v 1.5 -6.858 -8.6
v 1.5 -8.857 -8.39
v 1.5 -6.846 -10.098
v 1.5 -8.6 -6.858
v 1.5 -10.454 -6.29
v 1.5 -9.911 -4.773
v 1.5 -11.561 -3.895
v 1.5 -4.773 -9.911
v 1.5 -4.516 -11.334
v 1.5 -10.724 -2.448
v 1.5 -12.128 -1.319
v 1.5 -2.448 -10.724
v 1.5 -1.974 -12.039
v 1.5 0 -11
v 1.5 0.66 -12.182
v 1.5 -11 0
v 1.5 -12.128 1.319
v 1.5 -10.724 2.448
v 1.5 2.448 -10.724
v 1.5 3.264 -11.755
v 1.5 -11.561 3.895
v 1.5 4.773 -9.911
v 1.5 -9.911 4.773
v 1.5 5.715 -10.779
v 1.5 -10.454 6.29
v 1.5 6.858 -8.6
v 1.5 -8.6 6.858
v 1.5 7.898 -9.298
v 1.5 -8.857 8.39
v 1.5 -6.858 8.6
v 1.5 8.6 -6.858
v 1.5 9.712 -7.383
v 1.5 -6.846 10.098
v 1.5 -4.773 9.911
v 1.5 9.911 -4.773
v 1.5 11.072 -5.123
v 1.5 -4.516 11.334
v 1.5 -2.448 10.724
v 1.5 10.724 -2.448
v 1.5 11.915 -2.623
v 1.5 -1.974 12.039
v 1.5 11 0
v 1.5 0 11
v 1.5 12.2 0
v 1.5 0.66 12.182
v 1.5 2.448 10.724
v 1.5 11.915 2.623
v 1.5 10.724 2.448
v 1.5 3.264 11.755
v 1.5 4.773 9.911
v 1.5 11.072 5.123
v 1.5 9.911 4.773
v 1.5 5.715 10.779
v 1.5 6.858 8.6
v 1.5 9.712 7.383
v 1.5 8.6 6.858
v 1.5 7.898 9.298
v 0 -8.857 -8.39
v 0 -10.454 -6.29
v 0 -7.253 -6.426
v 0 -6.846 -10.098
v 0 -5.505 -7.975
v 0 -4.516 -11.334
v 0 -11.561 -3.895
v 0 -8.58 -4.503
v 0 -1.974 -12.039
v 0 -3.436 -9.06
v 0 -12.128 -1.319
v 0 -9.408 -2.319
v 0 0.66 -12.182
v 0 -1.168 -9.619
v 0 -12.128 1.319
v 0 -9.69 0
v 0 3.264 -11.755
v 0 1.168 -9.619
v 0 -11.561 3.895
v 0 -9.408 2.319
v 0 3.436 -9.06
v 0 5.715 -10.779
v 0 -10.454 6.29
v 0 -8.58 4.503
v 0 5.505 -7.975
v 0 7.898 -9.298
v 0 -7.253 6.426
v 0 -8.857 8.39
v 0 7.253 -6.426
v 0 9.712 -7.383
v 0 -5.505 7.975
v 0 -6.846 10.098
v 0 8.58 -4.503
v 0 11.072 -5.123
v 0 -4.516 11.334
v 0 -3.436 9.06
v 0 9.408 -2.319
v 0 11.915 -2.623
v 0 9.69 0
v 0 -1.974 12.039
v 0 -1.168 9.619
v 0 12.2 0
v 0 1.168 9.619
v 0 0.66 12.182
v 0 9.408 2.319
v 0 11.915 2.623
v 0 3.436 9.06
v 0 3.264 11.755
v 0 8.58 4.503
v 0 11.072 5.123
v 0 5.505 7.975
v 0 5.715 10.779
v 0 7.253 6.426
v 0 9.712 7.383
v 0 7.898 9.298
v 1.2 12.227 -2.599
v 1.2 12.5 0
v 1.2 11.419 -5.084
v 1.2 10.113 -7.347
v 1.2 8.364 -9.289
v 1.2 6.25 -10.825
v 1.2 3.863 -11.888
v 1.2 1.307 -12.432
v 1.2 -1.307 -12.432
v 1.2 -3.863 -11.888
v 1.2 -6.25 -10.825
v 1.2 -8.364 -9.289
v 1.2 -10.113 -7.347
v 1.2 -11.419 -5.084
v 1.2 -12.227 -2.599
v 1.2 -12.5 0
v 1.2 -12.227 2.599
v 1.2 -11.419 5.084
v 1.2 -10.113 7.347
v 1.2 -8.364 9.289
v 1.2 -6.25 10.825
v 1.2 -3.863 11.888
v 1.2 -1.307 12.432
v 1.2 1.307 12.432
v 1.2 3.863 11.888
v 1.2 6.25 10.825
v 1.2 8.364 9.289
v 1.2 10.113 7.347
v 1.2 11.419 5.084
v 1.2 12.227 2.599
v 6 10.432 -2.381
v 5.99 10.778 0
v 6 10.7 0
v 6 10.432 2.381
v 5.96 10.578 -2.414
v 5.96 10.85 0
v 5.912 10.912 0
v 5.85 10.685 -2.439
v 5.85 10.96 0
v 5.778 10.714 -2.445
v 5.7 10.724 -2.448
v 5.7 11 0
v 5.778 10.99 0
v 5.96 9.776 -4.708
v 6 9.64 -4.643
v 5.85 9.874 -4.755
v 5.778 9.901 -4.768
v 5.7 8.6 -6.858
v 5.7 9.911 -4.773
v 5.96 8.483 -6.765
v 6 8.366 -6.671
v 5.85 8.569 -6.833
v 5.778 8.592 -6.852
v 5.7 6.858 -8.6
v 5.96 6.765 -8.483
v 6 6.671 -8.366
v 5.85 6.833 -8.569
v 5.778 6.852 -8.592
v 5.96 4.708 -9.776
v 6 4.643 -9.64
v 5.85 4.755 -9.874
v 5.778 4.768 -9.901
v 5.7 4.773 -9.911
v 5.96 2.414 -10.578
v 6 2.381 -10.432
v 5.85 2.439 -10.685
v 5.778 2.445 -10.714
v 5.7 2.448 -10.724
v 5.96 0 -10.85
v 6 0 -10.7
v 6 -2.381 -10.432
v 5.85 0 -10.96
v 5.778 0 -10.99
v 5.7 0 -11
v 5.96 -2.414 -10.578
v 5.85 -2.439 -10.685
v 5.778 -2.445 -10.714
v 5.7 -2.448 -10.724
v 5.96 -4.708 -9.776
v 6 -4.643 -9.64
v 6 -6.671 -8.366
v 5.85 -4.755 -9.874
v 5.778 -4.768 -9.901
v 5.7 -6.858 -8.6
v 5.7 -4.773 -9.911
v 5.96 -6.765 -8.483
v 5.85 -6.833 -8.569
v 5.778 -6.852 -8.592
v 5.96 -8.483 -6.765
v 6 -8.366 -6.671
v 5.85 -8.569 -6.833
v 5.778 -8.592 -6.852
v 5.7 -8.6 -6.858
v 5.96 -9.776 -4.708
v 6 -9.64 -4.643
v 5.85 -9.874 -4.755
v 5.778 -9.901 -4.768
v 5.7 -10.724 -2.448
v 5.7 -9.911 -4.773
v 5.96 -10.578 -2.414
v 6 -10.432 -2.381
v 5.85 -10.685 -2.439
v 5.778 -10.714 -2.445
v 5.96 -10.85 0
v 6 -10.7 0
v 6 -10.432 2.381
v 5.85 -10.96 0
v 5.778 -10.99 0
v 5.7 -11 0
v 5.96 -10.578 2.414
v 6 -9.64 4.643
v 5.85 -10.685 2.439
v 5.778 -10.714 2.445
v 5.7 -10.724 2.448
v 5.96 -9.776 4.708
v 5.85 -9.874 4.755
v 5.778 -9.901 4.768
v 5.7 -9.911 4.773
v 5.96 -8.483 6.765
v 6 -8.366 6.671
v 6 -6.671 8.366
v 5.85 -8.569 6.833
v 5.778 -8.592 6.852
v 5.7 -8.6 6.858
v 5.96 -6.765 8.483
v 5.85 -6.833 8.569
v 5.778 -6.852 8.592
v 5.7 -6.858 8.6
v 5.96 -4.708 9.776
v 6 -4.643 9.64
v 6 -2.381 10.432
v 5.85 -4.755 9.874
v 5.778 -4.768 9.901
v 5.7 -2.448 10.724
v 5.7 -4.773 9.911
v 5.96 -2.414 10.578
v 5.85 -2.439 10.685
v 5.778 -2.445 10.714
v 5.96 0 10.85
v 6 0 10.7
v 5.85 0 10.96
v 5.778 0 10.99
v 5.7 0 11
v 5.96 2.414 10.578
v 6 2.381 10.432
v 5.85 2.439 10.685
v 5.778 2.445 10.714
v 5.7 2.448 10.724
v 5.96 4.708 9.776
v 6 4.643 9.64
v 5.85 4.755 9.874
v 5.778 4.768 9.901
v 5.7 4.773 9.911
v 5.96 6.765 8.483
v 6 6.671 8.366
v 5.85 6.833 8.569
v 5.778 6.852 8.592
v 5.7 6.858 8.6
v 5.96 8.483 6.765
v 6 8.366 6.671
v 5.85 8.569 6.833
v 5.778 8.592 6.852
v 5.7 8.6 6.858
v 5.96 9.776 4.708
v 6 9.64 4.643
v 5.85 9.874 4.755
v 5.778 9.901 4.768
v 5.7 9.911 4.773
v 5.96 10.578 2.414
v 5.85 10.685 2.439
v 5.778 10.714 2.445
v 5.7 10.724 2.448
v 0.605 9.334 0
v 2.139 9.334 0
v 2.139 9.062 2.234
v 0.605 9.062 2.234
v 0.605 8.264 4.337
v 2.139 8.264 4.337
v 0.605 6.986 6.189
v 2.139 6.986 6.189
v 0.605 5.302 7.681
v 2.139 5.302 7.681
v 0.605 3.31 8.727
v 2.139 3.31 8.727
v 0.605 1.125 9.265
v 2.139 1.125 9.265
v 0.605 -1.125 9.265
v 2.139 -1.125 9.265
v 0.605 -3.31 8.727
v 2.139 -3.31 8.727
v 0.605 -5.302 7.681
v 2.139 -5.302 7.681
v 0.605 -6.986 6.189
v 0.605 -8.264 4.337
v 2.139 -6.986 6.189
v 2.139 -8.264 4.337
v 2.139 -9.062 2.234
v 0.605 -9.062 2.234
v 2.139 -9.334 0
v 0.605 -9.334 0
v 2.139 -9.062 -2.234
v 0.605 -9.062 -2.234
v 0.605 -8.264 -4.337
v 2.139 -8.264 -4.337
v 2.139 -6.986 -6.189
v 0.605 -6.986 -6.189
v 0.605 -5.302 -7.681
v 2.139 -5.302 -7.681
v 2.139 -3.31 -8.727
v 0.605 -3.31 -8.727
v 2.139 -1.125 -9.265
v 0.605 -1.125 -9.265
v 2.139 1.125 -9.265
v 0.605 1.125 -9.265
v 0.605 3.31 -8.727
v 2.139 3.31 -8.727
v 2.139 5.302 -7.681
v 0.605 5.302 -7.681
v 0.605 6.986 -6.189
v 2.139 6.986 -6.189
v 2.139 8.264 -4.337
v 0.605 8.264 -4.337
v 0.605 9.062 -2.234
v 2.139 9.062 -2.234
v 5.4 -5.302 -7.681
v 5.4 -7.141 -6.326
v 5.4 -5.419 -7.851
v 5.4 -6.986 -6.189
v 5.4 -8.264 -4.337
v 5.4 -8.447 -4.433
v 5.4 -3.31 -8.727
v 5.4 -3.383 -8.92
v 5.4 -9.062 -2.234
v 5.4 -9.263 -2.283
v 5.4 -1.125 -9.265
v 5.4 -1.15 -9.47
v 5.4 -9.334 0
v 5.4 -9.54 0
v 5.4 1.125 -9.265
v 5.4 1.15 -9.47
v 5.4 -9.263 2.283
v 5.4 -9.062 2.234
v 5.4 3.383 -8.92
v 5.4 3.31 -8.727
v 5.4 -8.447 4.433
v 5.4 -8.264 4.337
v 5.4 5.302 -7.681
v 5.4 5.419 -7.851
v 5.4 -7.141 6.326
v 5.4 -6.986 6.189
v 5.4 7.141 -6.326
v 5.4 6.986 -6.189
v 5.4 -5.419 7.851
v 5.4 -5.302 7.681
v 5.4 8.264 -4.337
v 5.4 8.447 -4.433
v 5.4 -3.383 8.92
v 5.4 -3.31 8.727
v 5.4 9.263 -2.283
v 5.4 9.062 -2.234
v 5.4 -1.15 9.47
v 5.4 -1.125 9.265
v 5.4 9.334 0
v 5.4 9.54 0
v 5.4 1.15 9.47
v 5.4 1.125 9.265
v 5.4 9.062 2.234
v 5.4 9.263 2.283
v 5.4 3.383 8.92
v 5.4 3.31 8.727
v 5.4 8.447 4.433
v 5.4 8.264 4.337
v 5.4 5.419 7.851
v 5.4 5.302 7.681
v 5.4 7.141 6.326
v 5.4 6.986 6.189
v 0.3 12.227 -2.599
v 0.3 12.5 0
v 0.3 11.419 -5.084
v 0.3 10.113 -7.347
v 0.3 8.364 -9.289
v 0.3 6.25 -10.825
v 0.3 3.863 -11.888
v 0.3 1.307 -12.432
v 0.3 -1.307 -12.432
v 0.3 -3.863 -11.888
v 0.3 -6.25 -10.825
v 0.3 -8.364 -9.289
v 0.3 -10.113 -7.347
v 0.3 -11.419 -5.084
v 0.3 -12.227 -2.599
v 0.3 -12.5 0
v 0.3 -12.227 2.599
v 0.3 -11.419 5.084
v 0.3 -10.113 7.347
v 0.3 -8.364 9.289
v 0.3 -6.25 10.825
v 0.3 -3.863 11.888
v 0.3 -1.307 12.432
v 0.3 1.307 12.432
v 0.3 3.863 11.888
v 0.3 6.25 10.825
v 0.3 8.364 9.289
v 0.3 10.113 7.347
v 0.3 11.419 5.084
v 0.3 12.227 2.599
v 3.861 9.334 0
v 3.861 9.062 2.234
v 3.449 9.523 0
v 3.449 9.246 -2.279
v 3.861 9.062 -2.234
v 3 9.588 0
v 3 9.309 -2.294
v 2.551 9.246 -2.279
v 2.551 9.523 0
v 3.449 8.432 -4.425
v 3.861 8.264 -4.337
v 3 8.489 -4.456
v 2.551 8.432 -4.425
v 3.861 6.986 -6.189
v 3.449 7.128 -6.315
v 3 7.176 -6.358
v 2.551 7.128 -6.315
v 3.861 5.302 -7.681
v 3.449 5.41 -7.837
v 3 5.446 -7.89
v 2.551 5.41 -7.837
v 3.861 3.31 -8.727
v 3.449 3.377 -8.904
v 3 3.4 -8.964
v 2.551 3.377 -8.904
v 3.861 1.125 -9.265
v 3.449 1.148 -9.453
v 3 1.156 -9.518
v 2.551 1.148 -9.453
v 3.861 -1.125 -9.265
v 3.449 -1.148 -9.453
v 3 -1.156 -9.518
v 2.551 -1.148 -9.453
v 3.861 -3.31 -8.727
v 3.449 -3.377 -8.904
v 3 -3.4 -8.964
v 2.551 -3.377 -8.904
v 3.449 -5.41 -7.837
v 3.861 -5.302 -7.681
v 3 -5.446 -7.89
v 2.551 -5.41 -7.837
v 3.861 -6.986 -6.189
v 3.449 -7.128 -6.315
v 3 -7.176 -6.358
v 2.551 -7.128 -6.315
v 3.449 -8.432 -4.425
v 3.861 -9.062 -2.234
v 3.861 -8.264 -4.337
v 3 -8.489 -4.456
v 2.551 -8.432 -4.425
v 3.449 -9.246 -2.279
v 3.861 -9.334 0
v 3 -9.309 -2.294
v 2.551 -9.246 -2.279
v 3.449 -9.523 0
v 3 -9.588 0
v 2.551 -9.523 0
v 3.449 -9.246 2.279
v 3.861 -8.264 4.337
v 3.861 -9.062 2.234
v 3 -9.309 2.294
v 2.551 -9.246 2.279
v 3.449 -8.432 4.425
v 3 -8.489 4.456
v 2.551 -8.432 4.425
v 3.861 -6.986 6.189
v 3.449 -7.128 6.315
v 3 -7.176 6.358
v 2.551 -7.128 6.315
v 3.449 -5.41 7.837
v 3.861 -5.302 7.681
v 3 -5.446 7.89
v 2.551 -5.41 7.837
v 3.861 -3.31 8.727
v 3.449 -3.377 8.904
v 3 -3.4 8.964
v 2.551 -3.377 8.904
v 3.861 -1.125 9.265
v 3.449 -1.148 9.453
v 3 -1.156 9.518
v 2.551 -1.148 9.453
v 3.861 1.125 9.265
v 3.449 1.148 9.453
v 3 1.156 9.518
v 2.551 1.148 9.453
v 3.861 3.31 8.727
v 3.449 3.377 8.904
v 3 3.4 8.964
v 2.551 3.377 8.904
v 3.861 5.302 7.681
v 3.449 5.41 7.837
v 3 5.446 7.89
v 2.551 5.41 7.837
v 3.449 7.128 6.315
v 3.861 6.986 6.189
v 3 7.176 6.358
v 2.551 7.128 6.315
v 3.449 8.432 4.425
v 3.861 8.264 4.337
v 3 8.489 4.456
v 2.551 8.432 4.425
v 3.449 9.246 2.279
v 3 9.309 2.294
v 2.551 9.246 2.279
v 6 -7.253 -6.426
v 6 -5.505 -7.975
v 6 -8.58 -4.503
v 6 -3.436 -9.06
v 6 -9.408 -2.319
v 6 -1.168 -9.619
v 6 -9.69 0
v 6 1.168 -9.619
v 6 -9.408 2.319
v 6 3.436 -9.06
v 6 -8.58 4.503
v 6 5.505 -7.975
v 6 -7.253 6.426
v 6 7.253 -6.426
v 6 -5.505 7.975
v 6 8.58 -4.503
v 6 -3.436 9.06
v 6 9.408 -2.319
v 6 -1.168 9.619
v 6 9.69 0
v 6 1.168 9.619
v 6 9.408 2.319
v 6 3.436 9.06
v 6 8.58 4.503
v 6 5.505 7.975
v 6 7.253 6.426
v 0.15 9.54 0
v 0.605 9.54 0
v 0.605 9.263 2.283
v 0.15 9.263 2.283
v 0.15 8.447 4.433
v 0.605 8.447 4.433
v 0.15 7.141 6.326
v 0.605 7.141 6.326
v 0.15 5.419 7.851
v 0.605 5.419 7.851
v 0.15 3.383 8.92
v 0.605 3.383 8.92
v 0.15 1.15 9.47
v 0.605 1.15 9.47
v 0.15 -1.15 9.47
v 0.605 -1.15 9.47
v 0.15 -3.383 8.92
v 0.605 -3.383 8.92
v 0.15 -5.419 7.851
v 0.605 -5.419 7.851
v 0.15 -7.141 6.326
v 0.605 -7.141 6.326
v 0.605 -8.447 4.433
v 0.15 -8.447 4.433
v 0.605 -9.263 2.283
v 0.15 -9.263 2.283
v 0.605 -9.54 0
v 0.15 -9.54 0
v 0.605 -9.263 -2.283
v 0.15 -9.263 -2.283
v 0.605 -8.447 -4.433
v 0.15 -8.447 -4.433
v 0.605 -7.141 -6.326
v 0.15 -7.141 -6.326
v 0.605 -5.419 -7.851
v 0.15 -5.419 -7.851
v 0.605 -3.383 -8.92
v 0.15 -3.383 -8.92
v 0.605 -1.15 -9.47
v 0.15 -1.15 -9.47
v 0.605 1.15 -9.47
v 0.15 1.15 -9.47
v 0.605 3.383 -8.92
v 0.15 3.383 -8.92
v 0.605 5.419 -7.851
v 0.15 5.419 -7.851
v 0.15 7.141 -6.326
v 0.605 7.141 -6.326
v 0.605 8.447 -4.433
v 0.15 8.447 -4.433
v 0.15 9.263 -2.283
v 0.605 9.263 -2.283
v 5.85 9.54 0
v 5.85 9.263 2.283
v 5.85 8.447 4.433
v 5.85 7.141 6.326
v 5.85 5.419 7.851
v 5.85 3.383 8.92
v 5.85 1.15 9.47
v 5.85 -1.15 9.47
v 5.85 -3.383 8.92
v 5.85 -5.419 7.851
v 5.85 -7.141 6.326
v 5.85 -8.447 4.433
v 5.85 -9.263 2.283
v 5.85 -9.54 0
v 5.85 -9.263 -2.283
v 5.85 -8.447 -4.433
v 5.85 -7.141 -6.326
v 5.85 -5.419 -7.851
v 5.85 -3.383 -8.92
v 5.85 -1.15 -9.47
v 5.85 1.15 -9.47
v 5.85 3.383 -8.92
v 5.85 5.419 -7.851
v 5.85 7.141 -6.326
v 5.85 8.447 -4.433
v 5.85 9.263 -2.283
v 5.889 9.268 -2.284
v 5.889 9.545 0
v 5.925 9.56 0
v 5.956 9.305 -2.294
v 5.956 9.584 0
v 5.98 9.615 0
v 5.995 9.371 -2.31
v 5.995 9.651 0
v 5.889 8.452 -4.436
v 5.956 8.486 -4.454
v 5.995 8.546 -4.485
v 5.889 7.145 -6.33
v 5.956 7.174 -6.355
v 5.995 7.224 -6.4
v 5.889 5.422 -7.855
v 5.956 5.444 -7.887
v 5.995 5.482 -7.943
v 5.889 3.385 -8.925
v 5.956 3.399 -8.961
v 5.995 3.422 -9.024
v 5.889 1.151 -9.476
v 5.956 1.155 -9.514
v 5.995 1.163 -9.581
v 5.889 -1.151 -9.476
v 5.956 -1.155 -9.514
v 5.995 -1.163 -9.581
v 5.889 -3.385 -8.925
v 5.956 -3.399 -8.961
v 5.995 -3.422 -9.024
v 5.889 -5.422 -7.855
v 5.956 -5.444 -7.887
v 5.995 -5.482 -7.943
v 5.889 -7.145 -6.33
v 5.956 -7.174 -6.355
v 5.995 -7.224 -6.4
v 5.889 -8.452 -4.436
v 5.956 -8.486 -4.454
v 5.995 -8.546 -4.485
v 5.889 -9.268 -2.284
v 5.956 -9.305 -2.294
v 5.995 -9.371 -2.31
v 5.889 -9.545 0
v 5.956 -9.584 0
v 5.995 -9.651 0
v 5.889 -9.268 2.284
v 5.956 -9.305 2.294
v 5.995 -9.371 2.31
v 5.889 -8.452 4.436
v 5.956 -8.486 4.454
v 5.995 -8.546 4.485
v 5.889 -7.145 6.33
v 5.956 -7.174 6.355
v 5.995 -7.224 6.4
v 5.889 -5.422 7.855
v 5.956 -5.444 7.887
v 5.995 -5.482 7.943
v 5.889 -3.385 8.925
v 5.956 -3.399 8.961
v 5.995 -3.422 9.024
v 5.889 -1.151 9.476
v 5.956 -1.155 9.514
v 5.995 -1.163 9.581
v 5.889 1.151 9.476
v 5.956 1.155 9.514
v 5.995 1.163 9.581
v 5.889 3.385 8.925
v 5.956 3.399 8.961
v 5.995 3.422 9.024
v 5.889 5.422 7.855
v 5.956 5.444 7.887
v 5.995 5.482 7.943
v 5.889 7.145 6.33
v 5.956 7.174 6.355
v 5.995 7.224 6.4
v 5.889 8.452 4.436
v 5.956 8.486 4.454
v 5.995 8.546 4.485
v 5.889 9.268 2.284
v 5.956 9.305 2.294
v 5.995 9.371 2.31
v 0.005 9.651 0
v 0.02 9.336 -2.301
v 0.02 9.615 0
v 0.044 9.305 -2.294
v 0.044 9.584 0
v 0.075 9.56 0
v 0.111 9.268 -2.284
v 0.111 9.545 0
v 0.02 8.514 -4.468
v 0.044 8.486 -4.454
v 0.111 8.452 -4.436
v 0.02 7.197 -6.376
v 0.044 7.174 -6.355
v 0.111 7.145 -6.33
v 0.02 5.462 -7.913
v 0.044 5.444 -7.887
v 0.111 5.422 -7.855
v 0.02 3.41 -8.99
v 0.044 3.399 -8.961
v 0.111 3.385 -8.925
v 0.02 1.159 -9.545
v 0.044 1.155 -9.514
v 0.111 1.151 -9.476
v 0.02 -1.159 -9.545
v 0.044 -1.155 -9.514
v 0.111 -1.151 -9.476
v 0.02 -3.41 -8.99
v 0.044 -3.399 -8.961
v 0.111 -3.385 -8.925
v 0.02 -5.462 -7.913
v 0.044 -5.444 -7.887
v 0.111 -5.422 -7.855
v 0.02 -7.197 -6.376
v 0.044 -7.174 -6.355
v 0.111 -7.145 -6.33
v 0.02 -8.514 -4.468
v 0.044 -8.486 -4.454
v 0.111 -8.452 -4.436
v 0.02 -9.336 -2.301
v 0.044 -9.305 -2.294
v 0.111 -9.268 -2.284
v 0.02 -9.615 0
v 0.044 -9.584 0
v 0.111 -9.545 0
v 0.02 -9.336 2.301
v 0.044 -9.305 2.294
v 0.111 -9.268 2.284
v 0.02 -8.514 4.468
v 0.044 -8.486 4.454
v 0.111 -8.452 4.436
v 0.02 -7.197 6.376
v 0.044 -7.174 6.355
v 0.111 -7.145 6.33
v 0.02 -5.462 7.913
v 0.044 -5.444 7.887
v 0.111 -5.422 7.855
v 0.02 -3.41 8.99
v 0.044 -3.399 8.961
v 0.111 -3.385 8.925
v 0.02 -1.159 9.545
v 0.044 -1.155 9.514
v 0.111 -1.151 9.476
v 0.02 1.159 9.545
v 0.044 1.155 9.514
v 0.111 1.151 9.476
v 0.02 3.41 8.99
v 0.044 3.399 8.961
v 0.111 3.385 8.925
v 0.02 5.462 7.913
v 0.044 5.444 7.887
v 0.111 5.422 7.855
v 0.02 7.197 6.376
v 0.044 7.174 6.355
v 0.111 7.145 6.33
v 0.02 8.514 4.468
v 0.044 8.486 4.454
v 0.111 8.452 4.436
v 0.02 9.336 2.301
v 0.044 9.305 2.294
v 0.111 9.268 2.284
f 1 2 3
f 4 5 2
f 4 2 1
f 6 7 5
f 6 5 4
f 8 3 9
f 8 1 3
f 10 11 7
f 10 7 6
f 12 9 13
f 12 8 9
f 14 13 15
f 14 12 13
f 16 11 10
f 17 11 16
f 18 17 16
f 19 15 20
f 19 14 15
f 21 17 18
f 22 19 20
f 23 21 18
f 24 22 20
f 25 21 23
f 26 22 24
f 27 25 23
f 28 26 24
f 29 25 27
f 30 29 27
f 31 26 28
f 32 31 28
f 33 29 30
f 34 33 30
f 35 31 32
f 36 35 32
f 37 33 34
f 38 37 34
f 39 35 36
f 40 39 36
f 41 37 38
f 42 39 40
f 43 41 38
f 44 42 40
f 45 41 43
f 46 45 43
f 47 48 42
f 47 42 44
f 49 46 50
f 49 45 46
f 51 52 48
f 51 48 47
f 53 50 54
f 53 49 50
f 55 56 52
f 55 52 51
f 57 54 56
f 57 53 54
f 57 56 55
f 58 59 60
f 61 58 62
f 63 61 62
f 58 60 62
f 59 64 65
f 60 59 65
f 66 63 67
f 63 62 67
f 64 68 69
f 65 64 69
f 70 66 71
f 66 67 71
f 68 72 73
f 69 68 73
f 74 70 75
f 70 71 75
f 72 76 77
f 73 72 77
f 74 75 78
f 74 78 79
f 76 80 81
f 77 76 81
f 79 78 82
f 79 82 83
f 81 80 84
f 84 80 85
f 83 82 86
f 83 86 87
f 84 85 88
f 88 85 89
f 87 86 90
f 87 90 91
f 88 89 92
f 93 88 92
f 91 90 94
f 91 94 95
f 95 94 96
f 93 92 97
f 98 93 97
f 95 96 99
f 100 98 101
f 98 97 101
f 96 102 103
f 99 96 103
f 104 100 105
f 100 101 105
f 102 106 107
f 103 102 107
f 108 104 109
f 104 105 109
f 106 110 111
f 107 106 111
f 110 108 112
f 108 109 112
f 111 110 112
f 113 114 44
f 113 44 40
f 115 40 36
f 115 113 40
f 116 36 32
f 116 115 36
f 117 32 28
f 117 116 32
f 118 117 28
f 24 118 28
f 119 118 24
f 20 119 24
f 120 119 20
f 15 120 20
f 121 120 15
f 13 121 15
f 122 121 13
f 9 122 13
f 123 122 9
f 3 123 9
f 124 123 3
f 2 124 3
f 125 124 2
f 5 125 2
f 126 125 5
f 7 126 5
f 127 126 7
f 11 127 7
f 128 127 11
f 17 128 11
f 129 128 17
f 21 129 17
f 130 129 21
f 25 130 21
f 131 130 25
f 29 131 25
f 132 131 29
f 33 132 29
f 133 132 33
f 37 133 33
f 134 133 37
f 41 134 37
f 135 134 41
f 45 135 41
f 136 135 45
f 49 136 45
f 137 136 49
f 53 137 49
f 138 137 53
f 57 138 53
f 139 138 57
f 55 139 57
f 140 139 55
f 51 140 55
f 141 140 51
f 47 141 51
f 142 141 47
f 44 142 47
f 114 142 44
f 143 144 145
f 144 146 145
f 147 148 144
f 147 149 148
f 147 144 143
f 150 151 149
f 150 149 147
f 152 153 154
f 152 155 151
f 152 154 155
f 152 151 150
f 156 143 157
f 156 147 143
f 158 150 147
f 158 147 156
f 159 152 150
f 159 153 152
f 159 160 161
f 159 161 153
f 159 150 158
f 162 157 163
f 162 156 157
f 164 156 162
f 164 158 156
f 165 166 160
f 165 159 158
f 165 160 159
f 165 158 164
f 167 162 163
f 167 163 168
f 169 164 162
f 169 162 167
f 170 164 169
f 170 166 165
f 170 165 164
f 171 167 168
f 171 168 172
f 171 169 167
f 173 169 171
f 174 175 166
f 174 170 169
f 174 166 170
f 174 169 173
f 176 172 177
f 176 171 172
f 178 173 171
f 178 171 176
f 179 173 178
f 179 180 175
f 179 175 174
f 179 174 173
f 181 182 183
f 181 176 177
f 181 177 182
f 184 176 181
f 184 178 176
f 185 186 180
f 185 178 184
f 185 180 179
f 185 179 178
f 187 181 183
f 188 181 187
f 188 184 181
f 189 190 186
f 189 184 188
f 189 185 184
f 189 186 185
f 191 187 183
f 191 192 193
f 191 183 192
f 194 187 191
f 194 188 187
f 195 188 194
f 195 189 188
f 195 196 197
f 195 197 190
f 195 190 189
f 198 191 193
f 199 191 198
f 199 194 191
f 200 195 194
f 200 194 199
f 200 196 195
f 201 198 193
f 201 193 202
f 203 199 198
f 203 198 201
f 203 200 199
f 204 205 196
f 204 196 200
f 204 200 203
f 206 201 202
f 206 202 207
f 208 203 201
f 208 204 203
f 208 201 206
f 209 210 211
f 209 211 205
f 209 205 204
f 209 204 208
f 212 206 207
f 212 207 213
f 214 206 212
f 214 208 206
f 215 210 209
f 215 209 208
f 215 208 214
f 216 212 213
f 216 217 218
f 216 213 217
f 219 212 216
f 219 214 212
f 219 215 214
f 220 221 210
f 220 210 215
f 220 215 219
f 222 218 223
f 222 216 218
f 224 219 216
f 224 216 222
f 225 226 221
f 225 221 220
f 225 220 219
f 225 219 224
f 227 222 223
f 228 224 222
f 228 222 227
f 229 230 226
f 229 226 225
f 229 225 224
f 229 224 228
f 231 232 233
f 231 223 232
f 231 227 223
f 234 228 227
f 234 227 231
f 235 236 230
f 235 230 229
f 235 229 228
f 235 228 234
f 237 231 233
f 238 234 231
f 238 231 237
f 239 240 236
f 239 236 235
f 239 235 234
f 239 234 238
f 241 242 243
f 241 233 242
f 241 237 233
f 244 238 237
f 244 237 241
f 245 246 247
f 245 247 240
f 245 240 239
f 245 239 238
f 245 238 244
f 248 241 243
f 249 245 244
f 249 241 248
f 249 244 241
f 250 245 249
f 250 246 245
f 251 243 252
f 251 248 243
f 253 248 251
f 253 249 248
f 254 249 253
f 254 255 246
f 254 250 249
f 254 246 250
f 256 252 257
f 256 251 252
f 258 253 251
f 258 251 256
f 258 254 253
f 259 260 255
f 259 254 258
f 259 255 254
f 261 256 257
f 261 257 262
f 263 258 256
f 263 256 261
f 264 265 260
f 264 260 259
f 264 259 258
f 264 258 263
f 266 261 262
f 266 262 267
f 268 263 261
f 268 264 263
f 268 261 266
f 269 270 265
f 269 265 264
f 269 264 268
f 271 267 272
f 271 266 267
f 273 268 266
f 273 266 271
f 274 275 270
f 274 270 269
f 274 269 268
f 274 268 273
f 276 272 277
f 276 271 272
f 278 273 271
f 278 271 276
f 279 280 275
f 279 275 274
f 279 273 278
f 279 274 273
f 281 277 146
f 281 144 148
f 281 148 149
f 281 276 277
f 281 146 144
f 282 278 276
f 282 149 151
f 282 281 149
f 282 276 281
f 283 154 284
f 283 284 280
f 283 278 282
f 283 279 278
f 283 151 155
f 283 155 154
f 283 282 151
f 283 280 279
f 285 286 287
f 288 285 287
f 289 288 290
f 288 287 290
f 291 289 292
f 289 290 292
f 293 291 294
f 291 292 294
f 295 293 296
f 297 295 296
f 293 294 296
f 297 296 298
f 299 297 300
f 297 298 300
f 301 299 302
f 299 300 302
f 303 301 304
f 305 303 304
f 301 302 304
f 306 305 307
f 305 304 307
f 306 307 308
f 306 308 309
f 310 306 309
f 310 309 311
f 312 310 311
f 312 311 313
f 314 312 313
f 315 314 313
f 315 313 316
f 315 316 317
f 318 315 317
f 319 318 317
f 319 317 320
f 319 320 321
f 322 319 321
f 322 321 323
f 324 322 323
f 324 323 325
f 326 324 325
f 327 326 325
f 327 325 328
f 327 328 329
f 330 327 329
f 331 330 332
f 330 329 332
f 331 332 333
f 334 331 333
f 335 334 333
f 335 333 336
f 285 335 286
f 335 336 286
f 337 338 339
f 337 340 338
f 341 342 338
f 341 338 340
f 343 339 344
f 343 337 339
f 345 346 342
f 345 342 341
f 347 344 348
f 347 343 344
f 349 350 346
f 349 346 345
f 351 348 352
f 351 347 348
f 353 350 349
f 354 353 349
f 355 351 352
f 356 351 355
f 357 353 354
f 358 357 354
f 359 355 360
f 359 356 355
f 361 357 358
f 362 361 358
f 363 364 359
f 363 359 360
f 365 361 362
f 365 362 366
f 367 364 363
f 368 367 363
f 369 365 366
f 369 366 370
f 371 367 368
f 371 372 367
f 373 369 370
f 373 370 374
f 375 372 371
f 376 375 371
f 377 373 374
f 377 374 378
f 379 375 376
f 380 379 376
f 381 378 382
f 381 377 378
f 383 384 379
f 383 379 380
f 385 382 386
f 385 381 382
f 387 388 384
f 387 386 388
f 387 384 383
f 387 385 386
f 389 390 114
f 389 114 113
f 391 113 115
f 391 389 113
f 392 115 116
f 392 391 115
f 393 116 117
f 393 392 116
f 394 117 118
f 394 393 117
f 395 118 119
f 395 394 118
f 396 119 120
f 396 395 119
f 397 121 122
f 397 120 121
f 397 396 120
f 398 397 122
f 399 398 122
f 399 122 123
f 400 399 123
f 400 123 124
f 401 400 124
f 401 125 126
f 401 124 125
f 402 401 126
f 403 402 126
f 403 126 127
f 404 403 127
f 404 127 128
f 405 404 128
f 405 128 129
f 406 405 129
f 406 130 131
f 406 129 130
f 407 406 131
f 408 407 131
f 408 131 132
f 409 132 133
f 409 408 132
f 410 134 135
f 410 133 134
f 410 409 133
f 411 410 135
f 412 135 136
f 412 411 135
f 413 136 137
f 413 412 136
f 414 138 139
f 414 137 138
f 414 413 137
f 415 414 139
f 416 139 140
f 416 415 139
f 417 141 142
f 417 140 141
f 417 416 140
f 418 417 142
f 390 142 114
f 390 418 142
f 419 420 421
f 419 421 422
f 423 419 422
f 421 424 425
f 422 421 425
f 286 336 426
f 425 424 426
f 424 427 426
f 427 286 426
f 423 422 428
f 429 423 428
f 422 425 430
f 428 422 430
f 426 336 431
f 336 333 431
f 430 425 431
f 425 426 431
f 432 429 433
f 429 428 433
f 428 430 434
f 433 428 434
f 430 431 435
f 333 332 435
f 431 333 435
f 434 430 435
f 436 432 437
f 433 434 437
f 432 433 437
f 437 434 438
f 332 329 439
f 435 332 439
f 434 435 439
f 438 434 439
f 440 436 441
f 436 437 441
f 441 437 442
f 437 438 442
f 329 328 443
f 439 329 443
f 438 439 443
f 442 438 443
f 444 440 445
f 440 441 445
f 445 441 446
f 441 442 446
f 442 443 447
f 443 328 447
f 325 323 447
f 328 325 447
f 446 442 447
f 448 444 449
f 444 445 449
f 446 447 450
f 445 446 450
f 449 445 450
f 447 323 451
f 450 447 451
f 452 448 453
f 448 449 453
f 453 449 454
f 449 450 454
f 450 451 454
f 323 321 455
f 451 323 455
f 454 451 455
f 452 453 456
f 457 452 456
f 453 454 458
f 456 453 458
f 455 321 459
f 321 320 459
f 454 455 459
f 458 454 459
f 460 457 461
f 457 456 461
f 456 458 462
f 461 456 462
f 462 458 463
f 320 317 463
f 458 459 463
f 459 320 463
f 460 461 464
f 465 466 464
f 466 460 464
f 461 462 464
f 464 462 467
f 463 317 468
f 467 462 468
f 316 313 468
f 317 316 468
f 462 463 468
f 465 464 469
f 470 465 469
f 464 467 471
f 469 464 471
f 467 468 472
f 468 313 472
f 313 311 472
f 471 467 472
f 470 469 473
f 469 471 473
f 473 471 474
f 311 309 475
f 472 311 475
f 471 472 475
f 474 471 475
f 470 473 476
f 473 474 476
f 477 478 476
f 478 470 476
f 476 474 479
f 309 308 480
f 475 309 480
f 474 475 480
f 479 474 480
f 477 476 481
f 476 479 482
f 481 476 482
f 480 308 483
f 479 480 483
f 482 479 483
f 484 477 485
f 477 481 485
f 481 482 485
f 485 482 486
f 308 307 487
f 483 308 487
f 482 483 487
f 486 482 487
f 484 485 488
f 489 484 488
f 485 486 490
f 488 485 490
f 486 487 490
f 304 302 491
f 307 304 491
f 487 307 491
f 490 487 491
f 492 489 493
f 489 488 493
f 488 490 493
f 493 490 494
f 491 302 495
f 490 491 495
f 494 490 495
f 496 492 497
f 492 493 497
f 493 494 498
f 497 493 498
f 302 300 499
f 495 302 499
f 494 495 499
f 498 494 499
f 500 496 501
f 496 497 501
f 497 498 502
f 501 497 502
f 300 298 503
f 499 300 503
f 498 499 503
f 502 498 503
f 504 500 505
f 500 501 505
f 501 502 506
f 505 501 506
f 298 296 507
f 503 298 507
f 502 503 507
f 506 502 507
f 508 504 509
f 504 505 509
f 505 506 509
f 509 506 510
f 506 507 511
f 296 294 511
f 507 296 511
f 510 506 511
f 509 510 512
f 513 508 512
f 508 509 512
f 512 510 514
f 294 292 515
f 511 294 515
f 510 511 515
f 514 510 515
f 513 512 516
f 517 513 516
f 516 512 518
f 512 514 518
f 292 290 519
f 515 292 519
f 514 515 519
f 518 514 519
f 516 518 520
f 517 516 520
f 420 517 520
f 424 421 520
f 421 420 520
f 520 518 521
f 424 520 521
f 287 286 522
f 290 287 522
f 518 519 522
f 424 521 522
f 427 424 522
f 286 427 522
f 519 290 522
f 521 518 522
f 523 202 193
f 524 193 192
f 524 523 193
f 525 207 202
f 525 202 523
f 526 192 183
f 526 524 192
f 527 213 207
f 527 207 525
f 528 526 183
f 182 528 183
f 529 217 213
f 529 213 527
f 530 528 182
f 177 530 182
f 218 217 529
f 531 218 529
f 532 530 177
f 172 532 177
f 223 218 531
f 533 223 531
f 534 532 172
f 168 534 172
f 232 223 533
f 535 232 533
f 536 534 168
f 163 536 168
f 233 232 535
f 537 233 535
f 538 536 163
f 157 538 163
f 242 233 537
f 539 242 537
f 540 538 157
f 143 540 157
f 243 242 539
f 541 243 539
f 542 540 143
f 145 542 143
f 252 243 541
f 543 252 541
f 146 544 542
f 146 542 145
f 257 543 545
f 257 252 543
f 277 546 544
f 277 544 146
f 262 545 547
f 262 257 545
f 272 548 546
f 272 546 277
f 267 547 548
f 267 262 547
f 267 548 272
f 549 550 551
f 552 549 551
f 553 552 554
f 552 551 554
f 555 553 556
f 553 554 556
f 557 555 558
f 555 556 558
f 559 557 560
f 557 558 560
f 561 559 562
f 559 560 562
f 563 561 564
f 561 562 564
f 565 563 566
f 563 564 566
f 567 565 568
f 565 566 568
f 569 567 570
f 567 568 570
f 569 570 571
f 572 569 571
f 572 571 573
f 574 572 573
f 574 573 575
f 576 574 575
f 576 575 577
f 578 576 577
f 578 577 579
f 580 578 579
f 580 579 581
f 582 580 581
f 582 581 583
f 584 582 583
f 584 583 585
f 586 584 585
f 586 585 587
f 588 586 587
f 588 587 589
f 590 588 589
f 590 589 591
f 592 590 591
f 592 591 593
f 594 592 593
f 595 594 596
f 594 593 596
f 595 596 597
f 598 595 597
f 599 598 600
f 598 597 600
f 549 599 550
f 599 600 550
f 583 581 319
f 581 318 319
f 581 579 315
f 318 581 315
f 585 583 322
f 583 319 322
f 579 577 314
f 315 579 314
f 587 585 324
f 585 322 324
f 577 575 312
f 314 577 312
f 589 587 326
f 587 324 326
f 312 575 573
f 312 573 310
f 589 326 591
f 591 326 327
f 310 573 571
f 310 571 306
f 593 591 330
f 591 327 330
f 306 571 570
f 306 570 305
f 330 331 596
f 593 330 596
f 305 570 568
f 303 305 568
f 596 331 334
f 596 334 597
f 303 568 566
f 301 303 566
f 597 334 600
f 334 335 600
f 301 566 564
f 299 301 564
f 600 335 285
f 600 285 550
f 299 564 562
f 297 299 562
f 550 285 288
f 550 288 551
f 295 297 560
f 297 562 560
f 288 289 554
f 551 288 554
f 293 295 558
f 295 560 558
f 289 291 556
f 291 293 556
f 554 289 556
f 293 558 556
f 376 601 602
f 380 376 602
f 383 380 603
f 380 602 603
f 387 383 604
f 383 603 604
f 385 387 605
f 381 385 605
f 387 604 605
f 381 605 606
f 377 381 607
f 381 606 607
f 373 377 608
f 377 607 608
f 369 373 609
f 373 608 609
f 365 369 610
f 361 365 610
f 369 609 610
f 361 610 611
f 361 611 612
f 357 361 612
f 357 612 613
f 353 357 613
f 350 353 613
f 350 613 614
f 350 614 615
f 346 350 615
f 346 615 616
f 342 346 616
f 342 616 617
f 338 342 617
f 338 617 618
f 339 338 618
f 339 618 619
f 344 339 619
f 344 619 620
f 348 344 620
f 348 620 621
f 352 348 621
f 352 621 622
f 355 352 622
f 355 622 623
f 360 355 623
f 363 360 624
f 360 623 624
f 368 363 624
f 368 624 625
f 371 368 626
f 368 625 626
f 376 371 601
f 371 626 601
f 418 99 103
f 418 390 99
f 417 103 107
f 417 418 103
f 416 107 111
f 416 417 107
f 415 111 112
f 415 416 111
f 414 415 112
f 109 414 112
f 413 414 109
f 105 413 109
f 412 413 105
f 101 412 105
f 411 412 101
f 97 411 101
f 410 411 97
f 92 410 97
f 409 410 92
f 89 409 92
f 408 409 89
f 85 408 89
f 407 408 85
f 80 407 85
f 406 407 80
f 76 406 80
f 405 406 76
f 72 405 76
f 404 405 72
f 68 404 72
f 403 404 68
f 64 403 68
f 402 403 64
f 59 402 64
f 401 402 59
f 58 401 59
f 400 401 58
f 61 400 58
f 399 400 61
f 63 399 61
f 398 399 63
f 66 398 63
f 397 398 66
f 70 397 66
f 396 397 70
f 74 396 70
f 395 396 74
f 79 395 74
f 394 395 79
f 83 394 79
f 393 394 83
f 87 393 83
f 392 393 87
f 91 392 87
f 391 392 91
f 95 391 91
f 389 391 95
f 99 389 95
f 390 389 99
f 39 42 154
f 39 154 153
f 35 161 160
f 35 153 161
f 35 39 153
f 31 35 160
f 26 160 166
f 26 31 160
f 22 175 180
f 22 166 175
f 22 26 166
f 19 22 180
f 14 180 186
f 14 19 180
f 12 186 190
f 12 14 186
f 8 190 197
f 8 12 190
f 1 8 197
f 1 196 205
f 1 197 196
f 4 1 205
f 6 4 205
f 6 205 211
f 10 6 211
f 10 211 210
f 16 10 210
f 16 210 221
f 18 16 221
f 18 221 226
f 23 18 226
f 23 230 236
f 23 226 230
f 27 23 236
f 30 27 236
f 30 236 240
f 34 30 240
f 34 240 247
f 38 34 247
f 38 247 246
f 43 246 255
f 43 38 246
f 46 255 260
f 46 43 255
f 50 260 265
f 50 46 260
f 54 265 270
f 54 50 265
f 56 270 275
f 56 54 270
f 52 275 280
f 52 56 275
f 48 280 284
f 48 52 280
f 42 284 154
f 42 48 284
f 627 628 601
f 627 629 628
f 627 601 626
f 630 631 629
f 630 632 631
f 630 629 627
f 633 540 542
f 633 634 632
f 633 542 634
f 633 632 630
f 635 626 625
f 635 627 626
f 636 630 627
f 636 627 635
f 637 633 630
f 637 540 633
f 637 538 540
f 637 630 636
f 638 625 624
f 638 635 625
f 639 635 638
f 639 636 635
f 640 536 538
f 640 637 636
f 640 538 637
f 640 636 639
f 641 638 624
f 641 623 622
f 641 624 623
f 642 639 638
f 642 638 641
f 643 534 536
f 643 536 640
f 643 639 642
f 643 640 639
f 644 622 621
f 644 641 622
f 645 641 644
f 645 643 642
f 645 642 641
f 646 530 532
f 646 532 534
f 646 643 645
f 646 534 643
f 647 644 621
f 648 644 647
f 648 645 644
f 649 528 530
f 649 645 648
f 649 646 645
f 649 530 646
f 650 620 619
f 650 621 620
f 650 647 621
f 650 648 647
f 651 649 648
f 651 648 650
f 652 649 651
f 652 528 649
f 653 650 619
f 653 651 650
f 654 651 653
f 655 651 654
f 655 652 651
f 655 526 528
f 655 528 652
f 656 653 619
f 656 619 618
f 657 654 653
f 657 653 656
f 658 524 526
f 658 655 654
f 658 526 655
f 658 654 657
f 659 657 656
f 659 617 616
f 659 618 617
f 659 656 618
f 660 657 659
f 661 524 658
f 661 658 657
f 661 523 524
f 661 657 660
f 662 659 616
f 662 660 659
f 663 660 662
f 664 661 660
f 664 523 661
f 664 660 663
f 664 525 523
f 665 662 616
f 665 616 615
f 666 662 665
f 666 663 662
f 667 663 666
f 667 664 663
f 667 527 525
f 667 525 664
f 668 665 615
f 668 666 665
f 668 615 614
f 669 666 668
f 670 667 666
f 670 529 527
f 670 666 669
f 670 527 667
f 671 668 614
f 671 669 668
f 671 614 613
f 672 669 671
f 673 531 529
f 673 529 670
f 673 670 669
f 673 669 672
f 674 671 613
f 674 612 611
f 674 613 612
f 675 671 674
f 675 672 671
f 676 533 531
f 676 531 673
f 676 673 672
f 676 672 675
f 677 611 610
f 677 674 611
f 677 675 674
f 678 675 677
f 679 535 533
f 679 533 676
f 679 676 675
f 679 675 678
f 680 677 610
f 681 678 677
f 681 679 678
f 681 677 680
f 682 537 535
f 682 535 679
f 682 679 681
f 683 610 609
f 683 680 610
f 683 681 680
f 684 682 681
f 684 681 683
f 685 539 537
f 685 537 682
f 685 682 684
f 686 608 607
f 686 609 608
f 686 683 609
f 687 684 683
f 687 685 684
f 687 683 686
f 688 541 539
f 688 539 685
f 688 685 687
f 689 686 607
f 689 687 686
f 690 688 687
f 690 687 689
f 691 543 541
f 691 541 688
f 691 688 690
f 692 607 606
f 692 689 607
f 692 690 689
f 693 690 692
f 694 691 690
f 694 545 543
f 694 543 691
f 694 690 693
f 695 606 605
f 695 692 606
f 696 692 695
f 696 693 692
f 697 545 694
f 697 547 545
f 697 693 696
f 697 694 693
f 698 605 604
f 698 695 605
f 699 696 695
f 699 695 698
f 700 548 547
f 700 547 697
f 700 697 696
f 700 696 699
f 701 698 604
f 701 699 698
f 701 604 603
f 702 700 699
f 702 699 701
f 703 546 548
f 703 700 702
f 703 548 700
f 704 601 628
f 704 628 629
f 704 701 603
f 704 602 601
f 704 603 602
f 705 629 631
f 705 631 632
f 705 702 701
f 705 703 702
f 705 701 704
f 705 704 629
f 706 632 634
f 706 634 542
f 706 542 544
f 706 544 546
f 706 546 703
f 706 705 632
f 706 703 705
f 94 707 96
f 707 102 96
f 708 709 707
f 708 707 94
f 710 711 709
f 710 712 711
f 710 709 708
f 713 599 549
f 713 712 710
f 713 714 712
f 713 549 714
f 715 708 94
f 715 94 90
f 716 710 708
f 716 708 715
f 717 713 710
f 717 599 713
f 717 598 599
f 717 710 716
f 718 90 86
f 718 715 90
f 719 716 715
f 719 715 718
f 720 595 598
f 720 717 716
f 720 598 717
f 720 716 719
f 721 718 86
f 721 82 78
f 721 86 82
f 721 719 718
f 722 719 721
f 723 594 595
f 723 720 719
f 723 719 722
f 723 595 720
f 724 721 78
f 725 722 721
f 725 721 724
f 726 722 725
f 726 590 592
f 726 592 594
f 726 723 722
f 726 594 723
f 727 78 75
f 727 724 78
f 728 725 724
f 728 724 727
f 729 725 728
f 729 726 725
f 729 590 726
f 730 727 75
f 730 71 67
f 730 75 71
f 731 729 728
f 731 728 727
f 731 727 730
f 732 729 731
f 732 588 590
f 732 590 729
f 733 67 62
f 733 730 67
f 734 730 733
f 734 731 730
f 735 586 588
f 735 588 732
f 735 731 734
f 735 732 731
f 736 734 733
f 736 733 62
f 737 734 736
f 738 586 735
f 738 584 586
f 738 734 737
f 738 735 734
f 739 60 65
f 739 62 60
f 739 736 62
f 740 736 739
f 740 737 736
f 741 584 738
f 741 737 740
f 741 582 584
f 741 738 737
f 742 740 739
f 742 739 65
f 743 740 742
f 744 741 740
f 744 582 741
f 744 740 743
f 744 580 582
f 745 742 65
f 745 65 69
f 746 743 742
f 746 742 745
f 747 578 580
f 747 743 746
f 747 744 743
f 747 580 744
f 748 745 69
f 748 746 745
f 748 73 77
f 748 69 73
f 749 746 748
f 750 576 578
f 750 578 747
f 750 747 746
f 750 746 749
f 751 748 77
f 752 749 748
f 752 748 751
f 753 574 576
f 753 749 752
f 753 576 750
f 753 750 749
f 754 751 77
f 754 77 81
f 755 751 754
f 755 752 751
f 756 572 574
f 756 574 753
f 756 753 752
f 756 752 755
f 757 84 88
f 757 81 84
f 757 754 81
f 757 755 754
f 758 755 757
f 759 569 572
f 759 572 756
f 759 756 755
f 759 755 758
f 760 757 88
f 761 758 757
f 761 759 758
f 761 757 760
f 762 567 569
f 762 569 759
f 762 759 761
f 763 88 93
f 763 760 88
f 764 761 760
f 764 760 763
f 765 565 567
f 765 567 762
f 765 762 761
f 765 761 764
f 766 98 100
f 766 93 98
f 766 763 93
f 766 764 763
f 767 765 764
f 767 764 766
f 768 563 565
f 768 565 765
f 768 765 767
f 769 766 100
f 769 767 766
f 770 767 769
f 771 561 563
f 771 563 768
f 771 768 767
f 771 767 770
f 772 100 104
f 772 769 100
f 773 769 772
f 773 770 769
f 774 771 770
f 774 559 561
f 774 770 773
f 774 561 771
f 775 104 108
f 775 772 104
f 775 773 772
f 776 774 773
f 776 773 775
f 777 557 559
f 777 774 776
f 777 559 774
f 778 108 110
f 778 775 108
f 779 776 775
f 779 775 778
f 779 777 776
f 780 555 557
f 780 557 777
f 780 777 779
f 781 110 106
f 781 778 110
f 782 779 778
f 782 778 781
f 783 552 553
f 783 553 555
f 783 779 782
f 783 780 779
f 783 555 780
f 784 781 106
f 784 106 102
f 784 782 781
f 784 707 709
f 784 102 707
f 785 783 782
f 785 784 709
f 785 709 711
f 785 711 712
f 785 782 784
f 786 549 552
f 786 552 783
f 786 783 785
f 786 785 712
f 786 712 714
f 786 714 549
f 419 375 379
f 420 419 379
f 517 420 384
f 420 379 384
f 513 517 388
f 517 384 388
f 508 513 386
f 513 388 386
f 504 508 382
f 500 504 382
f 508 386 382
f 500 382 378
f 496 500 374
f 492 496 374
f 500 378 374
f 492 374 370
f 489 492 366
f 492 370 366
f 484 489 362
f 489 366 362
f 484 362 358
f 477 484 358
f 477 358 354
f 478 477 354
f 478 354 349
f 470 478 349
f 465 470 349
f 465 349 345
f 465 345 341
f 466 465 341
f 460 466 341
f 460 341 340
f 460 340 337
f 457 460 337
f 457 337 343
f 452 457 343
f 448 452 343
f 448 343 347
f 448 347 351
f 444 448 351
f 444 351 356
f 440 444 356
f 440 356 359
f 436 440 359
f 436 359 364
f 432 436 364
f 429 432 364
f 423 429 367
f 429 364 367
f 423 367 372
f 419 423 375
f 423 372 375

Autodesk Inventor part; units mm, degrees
sketch "Sketch_3" plane through (0, 0, 0) normal (0, 0, 1) x (1, 0, 0)
  line L0 (5.7, 0) -> (0, 0)
  line L1 (0, 12.2) -> (0, 9.69)
  arc A0 (0, 9.69) -> (0.15, 9.54) centre (0.15, 9.69) ccw
  line L2 (0.15, 9.54) -> (0.605, 9.54)
  line L3 (0.605, 9.54) -> (0.605, 9.3335)
  line L4 (0.605, 9.3335) -> (2.1386, 9.3335)
  arc A1 (3.8614, 9.3335) -> (2.1386, 9.3335) centre (3, 8) ccw
  line L5 (3.8614, 9.3335) -> (5.4, 9.3335)
  line L6 (5.4, 9.3335) -> (5.4, 9.54)
  line L7 (5.4, 9.54) -> (5.85, 9.54)
  arc A2 (5.85, 9.54) -> (6, 9.69) centre (5.85, 9.69) ccw
  line L8 (6, 9.69) -> (6, 10.7)
  arc A3 (6, 10.7) -> (5.7, 11) centre (5.7, 10.7) ccw
  line L9 (5.7, 11) -> (1.5, 11)
  line L10 (1.5, 11) -> (1.5, 12.2)
  line L11 (1.5, 12.2) -> (1.2, 12.5)
  line L12 (1.2, 12.5) -> (0.3, 12.5)
  line L13 (0.3, 12.5) -> (0, 12.2)
revolve "Revolution1" add sketch "Sketch_3" angle 360 about axis through (5.7, 0, 0) along (1, 0, 0)
ref_plane "1_XY" through (3, 0, 0) normal (1, 0, 0) x (0, 0, -1)
ref_plane "1_YZ" through (3, 0, 0) normal (0, 0, -1) x (0, 1, 0)
ref_plane "1_ZX" through (3, 0, 0) normal (0, 1, 0) x (1, 0, 0)
properties part number "RF-2210X2HH_or"
